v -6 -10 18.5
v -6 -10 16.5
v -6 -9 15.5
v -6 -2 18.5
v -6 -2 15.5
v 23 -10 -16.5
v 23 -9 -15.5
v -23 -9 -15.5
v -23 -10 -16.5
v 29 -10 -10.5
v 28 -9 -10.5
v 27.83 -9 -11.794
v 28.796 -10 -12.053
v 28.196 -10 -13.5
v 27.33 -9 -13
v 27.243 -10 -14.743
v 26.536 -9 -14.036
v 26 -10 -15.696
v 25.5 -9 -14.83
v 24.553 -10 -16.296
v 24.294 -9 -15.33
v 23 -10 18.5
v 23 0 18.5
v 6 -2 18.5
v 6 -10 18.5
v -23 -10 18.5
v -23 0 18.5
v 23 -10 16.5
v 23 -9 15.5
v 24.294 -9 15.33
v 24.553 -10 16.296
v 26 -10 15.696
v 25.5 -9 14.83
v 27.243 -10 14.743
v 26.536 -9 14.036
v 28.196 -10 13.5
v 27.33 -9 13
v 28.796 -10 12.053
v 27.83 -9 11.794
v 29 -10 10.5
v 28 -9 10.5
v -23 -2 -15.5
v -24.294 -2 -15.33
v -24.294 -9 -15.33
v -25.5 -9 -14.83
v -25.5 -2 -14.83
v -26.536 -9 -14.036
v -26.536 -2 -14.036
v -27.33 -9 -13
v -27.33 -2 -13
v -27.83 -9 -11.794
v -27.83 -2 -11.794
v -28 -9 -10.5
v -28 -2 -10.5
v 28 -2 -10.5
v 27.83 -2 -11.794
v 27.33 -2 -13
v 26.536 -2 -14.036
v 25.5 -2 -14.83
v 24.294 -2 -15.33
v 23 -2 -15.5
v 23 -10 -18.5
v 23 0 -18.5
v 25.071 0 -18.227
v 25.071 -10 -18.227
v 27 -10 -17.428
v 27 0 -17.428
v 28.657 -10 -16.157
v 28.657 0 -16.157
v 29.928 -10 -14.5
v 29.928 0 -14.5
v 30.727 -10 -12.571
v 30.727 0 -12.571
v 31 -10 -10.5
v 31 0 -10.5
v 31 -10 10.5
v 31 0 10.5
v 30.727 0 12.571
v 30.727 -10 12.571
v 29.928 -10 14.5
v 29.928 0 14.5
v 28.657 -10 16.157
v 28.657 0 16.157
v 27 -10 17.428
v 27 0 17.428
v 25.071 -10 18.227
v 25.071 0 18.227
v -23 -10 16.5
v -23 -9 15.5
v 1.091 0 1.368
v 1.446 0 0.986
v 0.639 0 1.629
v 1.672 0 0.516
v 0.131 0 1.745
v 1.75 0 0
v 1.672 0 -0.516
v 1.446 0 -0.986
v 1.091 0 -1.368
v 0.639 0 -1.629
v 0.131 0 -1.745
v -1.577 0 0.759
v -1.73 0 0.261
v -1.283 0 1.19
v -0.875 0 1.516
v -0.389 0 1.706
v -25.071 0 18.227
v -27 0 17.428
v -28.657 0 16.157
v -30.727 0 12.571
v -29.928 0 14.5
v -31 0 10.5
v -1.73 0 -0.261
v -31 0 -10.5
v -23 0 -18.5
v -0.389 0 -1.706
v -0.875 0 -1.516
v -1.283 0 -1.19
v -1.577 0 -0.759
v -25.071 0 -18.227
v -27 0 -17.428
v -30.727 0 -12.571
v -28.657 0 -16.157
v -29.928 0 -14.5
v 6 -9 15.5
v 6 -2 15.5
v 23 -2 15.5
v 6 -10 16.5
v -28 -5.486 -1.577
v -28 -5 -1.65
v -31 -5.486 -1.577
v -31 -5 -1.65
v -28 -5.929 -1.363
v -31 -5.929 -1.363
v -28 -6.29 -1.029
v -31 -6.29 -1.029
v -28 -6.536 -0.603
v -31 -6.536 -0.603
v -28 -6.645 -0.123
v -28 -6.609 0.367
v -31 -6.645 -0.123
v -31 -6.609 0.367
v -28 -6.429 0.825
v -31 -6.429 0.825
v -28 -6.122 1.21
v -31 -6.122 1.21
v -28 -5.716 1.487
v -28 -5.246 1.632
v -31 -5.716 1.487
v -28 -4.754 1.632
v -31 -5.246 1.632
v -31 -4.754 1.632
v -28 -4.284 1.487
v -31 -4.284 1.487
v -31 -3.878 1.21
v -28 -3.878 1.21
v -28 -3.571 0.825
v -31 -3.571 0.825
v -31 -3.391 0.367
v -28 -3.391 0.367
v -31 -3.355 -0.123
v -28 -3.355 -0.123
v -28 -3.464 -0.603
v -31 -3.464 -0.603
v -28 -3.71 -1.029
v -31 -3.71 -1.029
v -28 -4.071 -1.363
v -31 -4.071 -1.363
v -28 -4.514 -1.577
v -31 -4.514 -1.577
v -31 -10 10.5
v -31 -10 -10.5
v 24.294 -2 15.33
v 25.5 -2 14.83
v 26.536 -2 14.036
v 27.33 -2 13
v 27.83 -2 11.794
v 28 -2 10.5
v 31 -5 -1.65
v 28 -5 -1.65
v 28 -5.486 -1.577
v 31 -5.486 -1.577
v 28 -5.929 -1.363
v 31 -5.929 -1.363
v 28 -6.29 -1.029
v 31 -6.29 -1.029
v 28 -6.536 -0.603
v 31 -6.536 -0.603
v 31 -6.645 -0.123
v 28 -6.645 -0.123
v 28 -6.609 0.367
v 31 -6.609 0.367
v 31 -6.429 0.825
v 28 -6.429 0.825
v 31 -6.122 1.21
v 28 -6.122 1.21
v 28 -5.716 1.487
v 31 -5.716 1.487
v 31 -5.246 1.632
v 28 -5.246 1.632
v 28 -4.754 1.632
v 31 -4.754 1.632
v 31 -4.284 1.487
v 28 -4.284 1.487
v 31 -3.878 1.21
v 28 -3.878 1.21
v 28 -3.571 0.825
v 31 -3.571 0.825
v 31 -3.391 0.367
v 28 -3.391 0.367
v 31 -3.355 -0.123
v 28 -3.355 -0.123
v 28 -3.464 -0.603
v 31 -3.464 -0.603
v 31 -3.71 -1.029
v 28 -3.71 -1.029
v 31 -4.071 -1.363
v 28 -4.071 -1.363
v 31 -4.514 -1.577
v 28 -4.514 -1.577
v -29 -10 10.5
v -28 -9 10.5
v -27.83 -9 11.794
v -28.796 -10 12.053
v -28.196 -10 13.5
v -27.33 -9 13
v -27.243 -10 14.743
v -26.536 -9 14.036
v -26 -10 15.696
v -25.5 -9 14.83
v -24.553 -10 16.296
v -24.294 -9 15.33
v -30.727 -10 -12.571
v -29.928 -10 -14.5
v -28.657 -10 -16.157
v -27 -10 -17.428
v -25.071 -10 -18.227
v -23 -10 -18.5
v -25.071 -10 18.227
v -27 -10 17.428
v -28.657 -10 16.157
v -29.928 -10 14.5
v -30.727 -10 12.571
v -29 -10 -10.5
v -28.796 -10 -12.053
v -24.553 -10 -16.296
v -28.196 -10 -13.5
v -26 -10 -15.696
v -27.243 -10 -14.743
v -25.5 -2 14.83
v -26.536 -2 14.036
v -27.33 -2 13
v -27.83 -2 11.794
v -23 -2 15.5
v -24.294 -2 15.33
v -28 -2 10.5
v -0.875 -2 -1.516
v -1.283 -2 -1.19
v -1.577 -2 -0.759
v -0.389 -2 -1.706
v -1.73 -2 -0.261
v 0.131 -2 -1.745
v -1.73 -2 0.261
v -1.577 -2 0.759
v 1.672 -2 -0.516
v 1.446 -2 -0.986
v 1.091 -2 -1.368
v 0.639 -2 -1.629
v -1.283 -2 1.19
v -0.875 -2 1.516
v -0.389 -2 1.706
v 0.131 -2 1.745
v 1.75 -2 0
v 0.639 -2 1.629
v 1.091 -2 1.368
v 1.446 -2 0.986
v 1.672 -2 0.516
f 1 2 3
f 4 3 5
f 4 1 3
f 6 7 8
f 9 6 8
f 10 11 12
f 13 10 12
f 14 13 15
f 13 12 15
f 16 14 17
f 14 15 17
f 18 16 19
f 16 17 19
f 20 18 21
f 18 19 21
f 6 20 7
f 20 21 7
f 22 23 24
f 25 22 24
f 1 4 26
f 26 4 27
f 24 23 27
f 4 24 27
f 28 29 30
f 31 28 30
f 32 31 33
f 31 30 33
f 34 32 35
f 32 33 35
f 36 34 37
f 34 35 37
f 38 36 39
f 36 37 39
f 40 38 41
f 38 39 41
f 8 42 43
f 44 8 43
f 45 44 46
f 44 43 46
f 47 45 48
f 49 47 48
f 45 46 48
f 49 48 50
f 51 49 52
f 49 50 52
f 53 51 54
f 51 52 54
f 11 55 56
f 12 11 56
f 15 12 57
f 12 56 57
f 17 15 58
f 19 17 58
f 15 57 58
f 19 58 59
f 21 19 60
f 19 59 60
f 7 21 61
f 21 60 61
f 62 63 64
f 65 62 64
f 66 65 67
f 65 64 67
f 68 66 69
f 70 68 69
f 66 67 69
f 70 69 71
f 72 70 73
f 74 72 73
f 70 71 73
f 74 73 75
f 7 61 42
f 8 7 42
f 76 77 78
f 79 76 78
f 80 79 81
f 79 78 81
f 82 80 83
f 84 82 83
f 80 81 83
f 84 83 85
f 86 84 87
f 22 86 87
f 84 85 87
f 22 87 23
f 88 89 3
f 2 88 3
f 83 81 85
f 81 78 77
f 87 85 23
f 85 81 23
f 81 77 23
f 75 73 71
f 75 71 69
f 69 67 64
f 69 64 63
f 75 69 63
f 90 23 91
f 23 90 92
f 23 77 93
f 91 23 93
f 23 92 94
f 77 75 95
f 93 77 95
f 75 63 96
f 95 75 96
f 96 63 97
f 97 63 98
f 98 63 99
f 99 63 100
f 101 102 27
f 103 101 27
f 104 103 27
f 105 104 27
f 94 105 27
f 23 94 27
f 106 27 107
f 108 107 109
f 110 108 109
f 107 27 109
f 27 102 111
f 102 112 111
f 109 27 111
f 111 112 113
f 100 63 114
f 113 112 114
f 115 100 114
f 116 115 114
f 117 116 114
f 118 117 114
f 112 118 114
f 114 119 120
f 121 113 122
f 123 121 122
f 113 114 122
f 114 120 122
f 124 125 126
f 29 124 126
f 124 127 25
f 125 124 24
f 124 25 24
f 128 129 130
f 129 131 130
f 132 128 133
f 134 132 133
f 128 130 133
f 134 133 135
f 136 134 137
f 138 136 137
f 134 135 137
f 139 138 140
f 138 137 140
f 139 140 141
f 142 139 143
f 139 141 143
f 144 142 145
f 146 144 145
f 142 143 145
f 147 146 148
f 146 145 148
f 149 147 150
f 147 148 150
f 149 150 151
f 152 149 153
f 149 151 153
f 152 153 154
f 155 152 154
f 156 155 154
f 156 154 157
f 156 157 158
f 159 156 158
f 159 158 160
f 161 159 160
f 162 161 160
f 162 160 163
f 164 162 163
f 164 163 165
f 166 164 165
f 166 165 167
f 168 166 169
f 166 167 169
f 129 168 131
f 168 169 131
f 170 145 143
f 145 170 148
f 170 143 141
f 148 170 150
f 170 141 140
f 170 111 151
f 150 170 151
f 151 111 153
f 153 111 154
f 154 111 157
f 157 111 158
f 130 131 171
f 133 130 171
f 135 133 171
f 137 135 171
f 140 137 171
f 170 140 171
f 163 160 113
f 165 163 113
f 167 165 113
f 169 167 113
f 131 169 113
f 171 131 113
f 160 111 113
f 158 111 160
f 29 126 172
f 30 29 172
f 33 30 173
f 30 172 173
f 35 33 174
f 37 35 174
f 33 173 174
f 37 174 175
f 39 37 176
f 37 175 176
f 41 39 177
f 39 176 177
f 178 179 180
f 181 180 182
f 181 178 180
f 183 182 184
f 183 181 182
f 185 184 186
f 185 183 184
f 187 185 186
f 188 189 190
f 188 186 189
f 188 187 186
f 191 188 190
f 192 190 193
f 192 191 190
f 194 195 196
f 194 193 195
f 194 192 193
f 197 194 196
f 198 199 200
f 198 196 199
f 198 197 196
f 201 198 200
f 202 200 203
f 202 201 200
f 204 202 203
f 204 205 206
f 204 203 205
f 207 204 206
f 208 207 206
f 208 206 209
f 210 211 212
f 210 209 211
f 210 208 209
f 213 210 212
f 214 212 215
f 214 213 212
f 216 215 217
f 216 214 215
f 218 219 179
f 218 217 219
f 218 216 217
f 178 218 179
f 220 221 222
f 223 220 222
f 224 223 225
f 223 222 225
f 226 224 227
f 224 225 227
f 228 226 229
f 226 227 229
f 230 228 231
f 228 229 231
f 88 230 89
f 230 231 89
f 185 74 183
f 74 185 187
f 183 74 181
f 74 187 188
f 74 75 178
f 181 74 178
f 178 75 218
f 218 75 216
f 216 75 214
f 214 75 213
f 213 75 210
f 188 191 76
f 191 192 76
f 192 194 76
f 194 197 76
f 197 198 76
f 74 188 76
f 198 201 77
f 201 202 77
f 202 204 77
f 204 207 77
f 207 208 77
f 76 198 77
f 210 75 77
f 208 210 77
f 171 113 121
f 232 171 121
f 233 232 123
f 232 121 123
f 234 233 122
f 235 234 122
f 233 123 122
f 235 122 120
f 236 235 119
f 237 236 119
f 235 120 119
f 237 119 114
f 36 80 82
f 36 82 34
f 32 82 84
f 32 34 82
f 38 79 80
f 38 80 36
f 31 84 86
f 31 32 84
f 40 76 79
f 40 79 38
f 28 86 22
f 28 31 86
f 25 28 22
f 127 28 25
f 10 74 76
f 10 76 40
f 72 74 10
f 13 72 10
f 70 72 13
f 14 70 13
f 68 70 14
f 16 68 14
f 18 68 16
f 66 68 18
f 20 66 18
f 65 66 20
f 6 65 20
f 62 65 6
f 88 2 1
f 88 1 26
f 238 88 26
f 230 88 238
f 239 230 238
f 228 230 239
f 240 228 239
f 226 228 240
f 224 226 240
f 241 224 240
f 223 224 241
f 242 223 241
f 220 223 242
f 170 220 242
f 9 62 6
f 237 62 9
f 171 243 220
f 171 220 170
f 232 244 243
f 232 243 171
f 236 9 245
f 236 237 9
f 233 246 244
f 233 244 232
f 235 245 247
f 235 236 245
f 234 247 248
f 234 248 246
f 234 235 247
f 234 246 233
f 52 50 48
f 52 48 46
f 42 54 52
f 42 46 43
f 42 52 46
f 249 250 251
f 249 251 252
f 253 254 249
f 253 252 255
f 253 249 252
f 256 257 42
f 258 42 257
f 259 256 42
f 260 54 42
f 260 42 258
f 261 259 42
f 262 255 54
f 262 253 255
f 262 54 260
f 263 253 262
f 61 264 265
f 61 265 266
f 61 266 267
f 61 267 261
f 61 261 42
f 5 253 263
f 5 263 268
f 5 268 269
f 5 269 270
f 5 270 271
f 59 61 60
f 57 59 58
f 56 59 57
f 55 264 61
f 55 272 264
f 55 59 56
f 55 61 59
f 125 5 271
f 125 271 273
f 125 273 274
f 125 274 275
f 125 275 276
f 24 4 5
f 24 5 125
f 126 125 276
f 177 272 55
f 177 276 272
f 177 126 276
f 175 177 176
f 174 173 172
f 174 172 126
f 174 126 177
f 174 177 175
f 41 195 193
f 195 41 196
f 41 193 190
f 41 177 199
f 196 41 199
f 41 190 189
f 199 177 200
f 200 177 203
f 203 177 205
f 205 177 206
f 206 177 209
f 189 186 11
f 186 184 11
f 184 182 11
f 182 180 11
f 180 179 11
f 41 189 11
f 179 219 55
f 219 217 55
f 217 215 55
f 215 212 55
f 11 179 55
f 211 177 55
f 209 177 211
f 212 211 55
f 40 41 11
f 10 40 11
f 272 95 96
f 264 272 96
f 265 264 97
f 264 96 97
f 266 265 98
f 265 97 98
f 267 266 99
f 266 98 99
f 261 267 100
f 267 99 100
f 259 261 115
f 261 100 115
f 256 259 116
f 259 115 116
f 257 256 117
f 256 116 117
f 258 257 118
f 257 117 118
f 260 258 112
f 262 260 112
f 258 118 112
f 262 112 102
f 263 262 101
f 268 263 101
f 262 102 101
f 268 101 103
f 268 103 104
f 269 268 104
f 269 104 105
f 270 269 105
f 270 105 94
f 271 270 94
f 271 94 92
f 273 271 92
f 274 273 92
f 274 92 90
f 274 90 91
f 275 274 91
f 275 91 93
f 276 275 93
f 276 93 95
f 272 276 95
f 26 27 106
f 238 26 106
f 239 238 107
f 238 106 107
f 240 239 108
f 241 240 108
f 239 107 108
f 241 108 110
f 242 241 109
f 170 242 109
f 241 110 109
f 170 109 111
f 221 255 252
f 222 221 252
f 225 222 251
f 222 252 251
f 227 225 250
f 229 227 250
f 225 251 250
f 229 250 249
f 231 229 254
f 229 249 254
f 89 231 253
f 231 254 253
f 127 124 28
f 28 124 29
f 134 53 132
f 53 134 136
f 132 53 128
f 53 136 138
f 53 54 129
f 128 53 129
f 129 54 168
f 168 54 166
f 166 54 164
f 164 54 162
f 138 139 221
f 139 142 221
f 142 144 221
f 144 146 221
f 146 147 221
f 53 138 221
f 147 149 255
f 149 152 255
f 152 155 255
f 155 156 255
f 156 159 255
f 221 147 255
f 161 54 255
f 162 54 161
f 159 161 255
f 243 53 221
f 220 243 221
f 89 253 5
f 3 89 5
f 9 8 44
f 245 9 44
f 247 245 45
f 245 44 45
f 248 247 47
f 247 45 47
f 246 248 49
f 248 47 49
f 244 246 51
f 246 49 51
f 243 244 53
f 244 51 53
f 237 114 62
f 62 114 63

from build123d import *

# Parameters (mm, degrees)
BOSS_EXTRUDE1_DEPTH        = 10
BOSS_EXTRUDE2_DEPTH        = 2
F_3_5_3_5_DIAMETER_HOLE1_D = 3.5
SKETCH8_W                  = 12
SKETCH8_H                  = 8
CUT_EXTRUDE1_DEPTH         = 5
CHAMFER1_SIZE              = 1


with BuildPart() as part:
    # Sketch1 → Boss-Extrude1 (new body)
    with BuildSketch(Plane(origin=(0, 0, 0), x_dir=(1, 0, 0), z_dir=(0, 1, 0))):
        with BuildLine():
            Line((-23, 18.5), (23, 18.5))
            ThreePointArc((23, 18.5), (28.656854249, 16.156854249), (31, 10.5))
            Line((31, 10.5), (31, -10.5))
            ThreePointArc((31, -10.5), (28.656854249, -16.156854249), (23, -18.5))
            Line((23, -18.5), (-23, -18.5))
            ThreePointArc((-23, -18.5), (-28.656854249, -16.156854249), (-31, -10.5))
            Line((-31, -10.5), (-31, 10.5))
            ThreePointArc((-31, 10.5), (-28.656854249, 16.156854249), (-23, 18.5))
        make_face()
        with BuildLine():
            Line((-23, -15.5), (23, -15.5))
            ThreePointArc((23, -15.5), (26.535533906, -14.035533906), (28, -10.5))
            Line((28, -10.5), (28, 10.5))
            ThreePointArc((28, 10.5), (26.535533906, 14.035533906), (23, 15.5))
            Line((23, 15.5), (-23, 15.5))
            ThreePointArc((-23, 15.5), (-26.535533906, 14.035533906), (-28, 10.5))
            Line((-28, 10.5), (-28, -10.5))
            ThreePointArc((-28, -10.5), (-26.535533906, -14.035533906), (-23, -15.5))
        make_face(mode=Mode.SUBTRACT)
    extrude(amount=-BOSS_EXTRUDE1_DEPTH)

    # Sketch1<2> → Boss-Extrude2 (add)
    with BuildSketch(Plane(origin=(0, 0, 0), x_dir=(1, 0, 0), z_dir=(0, 1, 0))):
        with BuildLine():
            ThreePointArc((-28, -10.5), (-26.535533906, -14.035533906), (-23, -15.5))
            Line((-23, -15.5), (23, -15.5))
            ThreePointArc((23, -15.5), (26.535533906, -14.035533906), (28, -10.5))
            Line((28, -10.5), (28, 10.5))
            ThreePointArc((28, 10.5), (26.535533906, 14.035533906), (23, 15.5))
            Line((23, 15.5), (-23, 15.5))
            ThreePointArc((-23, 15.5), (-26.535533906, 14.035533906), (-28, 10.5))
            Line((-28, 10.5), (-28, -10.5))
        make_face()
    extrude(amount=-BOSS_EXTRUDE2_DEPTH)

    # Sketch4 → Ø3.3 (3.3) Diameter Hole1 (revolve, cut)
    with BuildSketch(Plane(origin=(31, -5, 0), x_dir=(0, 0, -1), z_dir=(0, 1, 0))):
        Polygon((0, 0), (0, 10.991420021), (1.65, 10), (1.65, 0), align=None)
    f_3_3_3_3_diameter_hole1 = revolve(axis=Axis((37.35, -5, 0), (-1, 0, 0)), mode=Mode.SUBTRACT)

    # Mirror1: Ø3.3 (3.3) Diameter Hole1 across plane
    add(f_3_3_3_3_diameter_hole1.mirror(Plane(origin=(0, 0, 0), x_dir=(0, 0, 1), z_dir=(1, 0, 0))), mode=Mode.SUBTRACT)

    # Ø3.5 (3.5) Diameter Hole1 (through all)
    with Locations(Plane(origin=(0, -2, 0), x_dir=(-1, 0, 0), z_dir=(0, -1, 0))):
        with Locations((0, 0)):
            Hole(F_3_5_3_5_DIAMETER_HOLE1_D / 2)

    # Sketch8 → Cut-Extrude1 (cut)
    with BuildSketch(Plane.XY.offset(18.5)):
        with Locations((0, -6)):
            Rectangle(SKETCH8_W, SKETCH8_H)
    extrude(amount=-CUT_EXTRUDE1_DEPTH, mode=Mode.SUBTRACT)

    # Chamfer1
    chamfer1_edges = [part.edges().sort_by_distance(p)[0] for p in [
        (14.5, -10, 15.5),
        (26.535533906, -10, 14.035533906),
        (28, -10, 0),
        (26.535533906, -10, -14.035533906),
        (0, -10, -15.5),
        (-14.5, -10, 15.5),
        (-26.535533906, -10, -14.035533906),
        (-26.535533906, -10, 14.035533906),
        (-28, -10, 0),
    ]]
    chamfer(chamfer1_edges, length=CHAMFER1_SIZE)


solid = part.part
